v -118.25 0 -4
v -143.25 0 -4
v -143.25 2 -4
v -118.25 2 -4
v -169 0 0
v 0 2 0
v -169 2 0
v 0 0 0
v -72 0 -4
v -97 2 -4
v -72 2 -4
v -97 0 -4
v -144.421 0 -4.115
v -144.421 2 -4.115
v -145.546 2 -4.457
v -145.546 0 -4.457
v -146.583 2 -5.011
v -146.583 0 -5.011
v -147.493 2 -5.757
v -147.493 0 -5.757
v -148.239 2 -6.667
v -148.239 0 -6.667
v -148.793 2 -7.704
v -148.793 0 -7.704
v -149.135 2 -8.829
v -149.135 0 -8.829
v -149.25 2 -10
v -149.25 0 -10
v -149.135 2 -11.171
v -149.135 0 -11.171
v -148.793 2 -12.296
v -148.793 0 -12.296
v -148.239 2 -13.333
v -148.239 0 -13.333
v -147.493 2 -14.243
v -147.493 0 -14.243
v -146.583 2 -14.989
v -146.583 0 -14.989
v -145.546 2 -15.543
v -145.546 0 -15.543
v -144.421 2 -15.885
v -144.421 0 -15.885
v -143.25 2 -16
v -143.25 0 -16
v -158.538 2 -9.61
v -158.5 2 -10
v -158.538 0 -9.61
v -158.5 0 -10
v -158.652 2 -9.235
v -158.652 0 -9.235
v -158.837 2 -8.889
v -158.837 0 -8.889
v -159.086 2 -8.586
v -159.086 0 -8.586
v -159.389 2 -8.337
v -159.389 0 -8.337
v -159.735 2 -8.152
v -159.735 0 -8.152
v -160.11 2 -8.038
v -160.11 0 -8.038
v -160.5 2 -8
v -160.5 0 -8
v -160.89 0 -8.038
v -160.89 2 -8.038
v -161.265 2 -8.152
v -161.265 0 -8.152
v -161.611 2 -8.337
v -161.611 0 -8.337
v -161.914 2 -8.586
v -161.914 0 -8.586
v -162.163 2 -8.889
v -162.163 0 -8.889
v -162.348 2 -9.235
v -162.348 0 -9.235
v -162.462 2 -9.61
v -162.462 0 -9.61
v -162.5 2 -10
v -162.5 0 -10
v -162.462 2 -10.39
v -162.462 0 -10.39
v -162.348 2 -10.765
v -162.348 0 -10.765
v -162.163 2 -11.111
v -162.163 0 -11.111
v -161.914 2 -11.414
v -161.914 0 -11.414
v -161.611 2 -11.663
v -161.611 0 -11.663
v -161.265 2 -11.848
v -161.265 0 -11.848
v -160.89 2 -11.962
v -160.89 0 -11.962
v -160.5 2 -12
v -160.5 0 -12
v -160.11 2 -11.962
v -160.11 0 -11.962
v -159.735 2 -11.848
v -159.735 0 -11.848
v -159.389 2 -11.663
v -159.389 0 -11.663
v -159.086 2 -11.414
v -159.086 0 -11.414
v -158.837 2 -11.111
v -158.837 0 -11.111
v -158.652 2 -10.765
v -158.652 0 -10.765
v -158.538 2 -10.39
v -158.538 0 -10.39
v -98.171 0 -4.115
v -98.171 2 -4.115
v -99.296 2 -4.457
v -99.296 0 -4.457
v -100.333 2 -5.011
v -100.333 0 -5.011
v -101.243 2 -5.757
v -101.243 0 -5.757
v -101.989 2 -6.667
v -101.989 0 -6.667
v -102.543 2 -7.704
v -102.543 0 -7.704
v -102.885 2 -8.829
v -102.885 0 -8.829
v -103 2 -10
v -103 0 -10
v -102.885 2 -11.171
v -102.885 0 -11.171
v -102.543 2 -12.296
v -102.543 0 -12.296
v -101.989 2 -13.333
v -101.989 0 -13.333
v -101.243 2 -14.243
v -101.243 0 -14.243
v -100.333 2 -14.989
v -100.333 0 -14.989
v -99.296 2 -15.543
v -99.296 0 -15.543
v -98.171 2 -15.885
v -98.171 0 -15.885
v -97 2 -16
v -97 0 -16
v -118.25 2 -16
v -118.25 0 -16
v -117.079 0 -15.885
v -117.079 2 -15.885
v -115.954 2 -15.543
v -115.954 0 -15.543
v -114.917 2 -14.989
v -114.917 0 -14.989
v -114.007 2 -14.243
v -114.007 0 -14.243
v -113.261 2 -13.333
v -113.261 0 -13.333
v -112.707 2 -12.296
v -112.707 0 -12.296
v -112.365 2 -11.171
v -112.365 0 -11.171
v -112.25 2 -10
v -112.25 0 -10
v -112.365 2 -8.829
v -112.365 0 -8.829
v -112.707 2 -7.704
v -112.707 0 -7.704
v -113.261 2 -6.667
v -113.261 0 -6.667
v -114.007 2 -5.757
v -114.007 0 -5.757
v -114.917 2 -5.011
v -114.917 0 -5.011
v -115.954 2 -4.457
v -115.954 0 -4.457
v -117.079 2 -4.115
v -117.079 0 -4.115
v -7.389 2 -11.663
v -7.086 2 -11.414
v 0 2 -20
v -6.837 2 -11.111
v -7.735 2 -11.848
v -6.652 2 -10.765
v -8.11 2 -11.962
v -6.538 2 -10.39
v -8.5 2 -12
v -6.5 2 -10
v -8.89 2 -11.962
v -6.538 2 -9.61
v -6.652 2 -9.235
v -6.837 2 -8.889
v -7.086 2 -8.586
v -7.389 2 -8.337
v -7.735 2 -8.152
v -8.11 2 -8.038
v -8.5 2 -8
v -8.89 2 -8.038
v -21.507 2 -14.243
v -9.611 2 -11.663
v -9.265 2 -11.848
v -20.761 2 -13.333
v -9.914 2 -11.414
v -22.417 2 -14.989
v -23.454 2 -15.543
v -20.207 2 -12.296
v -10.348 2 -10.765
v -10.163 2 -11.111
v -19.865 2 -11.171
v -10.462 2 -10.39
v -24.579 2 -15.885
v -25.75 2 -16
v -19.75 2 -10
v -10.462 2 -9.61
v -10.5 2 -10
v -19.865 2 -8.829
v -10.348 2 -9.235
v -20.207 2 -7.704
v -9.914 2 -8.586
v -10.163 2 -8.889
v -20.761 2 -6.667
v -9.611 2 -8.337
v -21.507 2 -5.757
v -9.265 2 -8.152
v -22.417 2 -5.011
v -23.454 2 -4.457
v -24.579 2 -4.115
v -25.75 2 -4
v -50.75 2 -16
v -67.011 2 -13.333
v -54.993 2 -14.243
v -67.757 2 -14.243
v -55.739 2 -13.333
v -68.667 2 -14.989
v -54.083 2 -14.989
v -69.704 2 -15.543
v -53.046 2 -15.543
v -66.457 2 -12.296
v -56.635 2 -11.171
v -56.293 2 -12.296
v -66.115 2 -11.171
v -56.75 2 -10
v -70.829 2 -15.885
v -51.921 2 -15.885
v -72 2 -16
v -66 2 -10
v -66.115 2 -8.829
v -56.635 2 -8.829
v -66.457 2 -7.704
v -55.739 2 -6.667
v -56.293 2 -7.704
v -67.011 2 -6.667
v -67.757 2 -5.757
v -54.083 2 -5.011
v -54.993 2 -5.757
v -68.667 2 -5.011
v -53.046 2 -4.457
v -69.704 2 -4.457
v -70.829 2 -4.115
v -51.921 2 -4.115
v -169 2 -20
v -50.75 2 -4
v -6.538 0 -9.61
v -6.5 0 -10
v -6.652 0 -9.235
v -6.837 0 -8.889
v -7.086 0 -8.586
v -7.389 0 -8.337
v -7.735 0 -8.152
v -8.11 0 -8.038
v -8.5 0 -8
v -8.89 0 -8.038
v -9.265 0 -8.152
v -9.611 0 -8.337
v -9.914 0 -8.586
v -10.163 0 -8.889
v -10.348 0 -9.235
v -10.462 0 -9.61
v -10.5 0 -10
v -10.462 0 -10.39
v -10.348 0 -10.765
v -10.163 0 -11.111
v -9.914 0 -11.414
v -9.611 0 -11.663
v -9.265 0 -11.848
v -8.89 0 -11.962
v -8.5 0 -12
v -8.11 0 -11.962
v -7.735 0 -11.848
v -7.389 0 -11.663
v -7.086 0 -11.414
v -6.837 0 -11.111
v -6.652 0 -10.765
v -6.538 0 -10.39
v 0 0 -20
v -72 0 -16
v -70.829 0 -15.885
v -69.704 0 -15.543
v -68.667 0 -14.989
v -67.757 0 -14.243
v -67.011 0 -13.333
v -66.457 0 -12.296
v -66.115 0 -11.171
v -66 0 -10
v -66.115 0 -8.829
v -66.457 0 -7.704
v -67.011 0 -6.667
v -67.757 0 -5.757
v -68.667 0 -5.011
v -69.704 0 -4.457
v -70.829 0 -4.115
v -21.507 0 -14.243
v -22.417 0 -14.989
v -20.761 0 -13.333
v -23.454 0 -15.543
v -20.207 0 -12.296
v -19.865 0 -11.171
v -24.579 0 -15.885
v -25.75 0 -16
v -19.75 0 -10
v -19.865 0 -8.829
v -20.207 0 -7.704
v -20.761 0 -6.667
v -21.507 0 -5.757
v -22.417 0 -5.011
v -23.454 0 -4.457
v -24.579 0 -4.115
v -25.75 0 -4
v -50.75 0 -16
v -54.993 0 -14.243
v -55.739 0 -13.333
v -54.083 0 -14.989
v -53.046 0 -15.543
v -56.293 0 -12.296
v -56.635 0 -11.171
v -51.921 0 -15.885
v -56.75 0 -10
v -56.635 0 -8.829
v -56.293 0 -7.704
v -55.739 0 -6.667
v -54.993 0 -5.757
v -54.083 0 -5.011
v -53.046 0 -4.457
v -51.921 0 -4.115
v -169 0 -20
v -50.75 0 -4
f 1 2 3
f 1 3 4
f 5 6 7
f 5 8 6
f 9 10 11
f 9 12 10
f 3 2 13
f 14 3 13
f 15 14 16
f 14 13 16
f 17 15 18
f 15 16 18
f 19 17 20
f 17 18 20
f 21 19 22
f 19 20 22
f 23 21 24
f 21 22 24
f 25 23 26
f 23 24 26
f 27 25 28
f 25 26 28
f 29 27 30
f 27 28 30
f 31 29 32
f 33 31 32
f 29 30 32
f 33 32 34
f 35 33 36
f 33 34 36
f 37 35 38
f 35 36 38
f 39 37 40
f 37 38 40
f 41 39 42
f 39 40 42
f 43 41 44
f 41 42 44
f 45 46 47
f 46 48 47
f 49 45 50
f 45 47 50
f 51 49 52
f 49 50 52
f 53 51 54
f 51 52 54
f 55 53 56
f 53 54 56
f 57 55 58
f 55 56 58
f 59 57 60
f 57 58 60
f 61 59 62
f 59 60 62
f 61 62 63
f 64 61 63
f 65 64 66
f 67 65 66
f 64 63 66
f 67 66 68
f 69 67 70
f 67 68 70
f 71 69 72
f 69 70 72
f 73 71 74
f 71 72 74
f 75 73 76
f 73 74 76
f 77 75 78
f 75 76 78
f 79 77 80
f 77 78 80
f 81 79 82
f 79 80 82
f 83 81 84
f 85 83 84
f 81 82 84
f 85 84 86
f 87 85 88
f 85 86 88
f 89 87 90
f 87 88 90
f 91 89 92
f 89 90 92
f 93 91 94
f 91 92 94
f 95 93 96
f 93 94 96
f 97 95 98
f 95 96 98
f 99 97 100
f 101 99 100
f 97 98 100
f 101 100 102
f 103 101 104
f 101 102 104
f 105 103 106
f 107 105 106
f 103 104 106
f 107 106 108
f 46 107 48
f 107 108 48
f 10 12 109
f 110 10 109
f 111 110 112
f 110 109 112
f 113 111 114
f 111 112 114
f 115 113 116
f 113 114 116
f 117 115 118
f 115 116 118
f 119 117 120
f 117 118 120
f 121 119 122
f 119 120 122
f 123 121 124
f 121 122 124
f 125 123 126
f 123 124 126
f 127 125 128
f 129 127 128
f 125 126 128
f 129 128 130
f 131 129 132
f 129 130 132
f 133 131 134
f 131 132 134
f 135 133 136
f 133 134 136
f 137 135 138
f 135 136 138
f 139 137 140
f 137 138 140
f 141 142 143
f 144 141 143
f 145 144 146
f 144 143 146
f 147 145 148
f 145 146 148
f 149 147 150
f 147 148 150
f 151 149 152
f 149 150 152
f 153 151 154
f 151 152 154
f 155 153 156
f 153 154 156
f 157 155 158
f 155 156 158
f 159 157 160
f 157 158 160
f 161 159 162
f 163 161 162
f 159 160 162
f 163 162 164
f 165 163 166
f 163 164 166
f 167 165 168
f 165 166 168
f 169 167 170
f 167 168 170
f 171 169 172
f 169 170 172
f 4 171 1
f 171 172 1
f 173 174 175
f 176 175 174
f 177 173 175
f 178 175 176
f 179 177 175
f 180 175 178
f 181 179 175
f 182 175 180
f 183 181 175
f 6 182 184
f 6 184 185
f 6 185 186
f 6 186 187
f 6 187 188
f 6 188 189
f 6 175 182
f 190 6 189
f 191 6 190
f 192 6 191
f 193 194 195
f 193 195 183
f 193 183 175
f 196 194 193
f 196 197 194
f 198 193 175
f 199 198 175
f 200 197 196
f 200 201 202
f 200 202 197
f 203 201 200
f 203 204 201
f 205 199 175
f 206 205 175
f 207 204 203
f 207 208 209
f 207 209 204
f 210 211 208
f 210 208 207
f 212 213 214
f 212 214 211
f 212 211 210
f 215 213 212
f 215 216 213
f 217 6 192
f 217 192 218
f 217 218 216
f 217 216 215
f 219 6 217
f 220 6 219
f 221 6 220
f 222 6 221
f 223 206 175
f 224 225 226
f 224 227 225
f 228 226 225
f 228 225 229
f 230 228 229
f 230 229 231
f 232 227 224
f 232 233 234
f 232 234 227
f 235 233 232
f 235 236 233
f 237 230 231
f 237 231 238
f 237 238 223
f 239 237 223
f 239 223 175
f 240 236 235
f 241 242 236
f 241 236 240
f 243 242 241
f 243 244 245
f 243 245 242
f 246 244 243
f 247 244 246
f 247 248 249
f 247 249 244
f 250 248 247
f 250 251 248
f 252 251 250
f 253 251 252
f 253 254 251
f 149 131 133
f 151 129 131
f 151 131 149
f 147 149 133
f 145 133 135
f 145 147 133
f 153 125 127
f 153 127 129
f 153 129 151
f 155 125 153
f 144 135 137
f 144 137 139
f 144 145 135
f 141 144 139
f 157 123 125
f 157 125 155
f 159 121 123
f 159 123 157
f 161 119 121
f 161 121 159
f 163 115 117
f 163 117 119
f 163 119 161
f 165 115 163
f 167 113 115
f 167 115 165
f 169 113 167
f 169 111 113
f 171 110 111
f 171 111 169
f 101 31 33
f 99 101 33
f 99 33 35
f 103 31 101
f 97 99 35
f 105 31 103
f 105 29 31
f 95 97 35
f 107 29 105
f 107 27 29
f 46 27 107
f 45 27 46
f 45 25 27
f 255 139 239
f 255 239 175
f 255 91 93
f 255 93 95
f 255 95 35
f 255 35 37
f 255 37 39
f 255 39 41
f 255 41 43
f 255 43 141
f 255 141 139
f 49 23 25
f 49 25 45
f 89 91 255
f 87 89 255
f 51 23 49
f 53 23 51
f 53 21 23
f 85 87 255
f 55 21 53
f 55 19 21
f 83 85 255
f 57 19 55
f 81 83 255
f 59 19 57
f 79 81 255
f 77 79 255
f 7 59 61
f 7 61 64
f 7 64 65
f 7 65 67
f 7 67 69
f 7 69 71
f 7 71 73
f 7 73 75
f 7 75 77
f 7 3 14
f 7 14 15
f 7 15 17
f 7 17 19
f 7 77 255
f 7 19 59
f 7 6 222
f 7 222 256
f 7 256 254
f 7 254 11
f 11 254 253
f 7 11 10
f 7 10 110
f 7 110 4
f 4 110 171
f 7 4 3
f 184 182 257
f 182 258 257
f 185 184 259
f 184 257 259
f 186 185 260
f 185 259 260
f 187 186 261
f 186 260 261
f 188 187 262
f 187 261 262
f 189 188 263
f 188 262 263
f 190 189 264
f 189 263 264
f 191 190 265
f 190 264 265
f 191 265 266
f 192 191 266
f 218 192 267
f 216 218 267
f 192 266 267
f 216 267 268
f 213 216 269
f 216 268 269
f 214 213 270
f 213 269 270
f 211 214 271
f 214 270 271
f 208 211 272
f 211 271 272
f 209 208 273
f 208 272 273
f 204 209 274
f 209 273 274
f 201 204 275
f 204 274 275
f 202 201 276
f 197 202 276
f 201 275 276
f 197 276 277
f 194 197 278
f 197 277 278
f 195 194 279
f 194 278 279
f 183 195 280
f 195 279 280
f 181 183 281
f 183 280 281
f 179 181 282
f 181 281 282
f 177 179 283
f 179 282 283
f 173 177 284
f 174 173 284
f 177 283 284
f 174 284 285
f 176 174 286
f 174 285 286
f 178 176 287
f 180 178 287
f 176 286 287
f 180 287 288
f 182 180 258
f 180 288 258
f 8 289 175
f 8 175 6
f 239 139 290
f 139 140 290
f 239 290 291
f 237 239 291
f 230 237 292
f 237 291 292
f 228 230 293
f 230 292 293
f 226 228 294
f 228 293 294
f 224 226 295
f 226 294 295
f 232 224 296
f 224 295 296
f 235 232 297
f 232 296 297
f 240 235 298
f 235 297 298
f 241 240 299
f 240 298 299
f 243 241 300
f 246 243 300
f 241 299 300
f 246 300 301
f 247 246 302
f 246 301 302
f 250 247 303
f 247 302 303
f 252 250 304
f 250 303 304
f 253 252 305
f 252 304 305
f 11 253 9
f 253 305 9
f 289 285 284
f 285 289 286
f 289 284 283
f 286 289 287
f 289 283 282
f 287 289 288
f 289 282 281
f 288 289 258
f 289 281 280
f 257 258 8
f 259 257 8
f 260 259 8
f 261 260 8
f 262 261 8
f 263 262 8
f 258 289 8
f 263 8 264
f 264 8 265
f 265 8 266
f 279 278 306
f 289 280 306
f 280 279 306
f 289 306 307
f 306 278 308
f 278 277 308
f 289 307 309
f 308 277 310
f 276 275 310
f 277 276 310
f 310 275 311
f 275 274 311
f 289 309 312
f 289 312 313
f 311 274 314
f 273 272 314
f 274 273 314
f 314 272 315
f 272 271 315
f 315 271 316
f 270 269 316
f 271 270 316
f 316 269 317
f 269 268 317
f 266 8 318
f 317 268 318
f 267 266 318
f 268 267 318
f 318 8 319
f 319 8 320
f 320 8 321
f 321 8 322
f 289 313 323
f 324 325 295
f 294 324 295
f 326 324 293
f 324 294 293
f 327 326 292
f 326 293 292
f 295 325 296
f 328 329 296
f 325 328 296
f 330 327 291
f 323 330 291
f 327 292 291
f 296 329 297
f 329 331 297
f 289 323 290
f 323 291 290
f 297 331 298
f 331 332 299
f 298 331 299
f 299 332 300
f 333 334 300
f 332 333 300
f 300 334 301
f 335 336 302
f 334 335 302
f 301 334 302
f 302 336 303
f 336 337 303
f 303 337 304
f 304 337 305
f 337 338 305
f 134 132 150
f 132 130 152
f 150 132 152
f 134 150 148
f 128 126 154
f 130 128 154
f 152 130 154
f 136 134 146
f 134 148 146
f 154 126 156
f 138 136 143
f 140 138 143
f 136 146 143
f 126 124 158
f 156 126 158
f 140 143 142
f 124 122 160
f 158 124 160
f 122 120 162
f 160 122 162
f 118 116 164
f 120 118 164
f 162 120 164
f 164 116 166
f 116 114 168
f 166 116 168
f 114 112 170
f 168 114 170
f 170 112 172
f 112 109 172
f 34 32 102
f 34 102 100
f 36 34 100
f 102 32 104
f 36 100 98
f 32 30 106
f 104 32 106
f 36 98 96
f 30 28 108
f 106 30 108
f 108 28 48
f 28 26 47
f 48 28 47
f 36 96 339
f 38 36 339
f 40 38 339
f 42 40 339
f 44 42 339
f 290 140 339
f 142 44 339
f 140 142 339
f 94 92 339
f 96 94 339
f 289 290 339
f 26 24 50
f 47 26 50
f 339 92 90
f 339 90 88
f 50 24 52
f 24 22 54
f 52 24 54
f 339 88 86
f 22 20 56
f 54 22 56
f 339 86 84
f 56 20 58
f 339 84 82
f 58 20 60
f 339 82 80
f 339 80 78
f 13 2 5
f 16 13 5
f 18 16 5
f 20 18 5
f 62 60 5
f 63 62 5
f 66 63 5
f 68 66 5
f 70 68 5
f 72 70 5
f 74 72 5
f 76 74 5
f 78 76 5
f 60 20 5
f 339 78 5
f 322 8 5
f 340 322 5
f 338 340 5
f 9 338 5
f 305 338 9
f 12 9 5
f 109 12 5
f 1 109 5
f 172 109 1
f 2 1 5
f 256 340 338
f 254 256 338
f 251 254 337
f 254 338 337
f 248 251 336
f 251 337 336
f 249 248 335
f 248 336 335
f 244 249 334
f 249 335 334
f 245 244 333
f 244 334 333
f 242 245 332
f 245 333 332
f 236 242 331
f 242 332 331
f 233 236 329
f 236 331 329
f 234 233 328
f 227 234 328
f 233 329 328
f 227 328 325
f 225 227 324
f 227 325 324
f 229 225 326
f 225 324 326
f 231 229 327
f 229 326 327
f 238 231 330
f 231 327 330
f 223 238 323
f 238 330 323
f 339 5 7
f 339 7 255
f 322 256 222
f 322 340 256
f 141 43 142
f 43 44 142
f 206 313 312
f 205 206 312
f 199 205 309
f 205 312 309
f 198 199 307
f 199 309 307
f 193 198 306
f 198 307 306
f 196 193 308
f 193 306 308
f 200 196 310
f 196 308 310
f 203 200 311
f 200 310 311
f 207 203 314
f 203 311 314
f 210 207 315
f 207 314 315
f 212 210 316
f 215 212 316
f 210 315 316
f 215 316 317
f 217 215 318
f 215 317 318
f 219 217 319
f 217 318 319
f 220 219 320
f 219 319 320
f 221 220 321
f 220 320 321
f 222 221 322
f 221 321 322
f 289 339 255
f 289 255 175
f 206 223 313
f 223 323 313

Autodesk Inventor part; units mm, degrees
ref_plane "YZ Plane" through (0, 0, 0) normal (1, 0, 0) x (0, 1, 0)
ref_plane "XZ Plane" through (0, 0, 0) normal (0, 1, 0) x (-1, 0, 0)
ref_plane "XY Plane" through (0, 0, 0) normal (0, 0, 1) x (1, 0, 0)
sketch "Sketch1" plane through (0, 0, 0) normal (0, 1, 0) x (-1, 0, 0)
  line L0 (0, 0) -> (169, 0)
  line L1 (169, 0) -> (169, -20)
  line L2 (169, -20) -> (0, -20)
  line L3 (0, -20) -> (0, 0)
  dimension "d0" = 169
  dimension "d1" = 20
extrude "base" add sketch "Sketch1" along normal blind 2
sketch "Sketch2" plane through (0, 0, 0) normal (0, -1, 0) x (1, 0, 0)
  circle A0 centre (-160.5, -10) radius 2
  circle A1 centre (-8.5, -10) radius 2
  line L0 (-169, -20) -> (-169, 0) construction
  line L1 (-169, -10) -> (0, -10) construction
  line L2 (0, 0) -> (0, -20) construction
  dimension "d4" = 152
  dimension "d5" = 4
  dimension "d6" = 4
  dimension "d7" = 8.5
  dimension "d8" = 169
extrude "holes" cut sketch "Sketch2" against normal blind 2
sketch "Sketch3" plane through (0, 0, 0) normal (0, -1, 0) x (1, 0, 0)
  line L0 (0, 0) -> (0, -20) construction
  line L1 (0, -10) -> (-169, -10) construction
  line L2 (-169, -20) -> (-169, 0) construction
  circle A0 centre (-160.5, -10) radius 2 construction
  line L3 (-160.5, -10) -> (-160.5, 5.7595) construction
  circle A1 centre (-8.5, -10) radius 2 construction
  line L4 (-8.5, -10) -> (-8.5, 9.069) construction
  arc A2 (-143.25, -4) -> (-143.25, -16) centre (-143.25, -10) ccw
  line L5 (-143.25, -10) -> (-143.25, -16) construction
  line L6 (-143.25, -10) -> (-143.25, -4) construction
  line L7 (-143.25, -4) -> (-118.25, -4)
  line L8 (-143.25, -16) -> (-118.25, -16)
  arc A3 (-118.25, -16) -> (-118.25, -4) centre (-118.25, -10) ccw
  line L9 (-118.25, -10) -> (-118.25, -16) construction
  line L10 (-118.25, -10) -> (-118.25, -4) construction
  line L11 (-97, -4) -> (-72, -4)
  arc A4 (-97, -4) -> (-97, -16) centre (-97, -10) ccw
  line L12 (-97, -16) -> (-72, -16)
  arc A5 (-72, -16) -> (-72, -4) centre (-72, -10) ccw
  line L13 (-50.75, -4) -> (-25.75, -4)
  arc A6 (-50.75, -4) -> (-50.75, -16) centre (-50.75, -10) ccw
  line L14 (-50.75, -16) -> (-25.75, -16)
  arc A7 (-25.75, -16) -> (-25.75, -4) centre (-25.75, -10) ccw
  point P0 (-158.5, -10)
  point P1 (-10.5, -10)
  point P2 (-149.25, -10)
  dimension "d11" = 180
  dimension "d12" = 6
  dimension "d13" = 180
  dimension "d14" = 25
  dimension "d18" = 46.25
  dimension "d23" = 148
  dimension "d25" = 9.25
extrude "Extrusion3" cut sketch "Sketch3" against normal blind 10
equation "\"d6\" = d5"
equation "\"d7\" = -0.5 * d4 + 0.5 * d8"
equation "\"d18\" = 2 * d12 + d25 + d14"
equation "\"d25\" = -1.5 * d12 - 0.75 * d14 + 0.25 * d23"
equation "\"d24\" = -1.5 * d12 - 0.75 * d14 + 0.25 * d23"
properties part number "transverseClipStiffener" material "Steel"
